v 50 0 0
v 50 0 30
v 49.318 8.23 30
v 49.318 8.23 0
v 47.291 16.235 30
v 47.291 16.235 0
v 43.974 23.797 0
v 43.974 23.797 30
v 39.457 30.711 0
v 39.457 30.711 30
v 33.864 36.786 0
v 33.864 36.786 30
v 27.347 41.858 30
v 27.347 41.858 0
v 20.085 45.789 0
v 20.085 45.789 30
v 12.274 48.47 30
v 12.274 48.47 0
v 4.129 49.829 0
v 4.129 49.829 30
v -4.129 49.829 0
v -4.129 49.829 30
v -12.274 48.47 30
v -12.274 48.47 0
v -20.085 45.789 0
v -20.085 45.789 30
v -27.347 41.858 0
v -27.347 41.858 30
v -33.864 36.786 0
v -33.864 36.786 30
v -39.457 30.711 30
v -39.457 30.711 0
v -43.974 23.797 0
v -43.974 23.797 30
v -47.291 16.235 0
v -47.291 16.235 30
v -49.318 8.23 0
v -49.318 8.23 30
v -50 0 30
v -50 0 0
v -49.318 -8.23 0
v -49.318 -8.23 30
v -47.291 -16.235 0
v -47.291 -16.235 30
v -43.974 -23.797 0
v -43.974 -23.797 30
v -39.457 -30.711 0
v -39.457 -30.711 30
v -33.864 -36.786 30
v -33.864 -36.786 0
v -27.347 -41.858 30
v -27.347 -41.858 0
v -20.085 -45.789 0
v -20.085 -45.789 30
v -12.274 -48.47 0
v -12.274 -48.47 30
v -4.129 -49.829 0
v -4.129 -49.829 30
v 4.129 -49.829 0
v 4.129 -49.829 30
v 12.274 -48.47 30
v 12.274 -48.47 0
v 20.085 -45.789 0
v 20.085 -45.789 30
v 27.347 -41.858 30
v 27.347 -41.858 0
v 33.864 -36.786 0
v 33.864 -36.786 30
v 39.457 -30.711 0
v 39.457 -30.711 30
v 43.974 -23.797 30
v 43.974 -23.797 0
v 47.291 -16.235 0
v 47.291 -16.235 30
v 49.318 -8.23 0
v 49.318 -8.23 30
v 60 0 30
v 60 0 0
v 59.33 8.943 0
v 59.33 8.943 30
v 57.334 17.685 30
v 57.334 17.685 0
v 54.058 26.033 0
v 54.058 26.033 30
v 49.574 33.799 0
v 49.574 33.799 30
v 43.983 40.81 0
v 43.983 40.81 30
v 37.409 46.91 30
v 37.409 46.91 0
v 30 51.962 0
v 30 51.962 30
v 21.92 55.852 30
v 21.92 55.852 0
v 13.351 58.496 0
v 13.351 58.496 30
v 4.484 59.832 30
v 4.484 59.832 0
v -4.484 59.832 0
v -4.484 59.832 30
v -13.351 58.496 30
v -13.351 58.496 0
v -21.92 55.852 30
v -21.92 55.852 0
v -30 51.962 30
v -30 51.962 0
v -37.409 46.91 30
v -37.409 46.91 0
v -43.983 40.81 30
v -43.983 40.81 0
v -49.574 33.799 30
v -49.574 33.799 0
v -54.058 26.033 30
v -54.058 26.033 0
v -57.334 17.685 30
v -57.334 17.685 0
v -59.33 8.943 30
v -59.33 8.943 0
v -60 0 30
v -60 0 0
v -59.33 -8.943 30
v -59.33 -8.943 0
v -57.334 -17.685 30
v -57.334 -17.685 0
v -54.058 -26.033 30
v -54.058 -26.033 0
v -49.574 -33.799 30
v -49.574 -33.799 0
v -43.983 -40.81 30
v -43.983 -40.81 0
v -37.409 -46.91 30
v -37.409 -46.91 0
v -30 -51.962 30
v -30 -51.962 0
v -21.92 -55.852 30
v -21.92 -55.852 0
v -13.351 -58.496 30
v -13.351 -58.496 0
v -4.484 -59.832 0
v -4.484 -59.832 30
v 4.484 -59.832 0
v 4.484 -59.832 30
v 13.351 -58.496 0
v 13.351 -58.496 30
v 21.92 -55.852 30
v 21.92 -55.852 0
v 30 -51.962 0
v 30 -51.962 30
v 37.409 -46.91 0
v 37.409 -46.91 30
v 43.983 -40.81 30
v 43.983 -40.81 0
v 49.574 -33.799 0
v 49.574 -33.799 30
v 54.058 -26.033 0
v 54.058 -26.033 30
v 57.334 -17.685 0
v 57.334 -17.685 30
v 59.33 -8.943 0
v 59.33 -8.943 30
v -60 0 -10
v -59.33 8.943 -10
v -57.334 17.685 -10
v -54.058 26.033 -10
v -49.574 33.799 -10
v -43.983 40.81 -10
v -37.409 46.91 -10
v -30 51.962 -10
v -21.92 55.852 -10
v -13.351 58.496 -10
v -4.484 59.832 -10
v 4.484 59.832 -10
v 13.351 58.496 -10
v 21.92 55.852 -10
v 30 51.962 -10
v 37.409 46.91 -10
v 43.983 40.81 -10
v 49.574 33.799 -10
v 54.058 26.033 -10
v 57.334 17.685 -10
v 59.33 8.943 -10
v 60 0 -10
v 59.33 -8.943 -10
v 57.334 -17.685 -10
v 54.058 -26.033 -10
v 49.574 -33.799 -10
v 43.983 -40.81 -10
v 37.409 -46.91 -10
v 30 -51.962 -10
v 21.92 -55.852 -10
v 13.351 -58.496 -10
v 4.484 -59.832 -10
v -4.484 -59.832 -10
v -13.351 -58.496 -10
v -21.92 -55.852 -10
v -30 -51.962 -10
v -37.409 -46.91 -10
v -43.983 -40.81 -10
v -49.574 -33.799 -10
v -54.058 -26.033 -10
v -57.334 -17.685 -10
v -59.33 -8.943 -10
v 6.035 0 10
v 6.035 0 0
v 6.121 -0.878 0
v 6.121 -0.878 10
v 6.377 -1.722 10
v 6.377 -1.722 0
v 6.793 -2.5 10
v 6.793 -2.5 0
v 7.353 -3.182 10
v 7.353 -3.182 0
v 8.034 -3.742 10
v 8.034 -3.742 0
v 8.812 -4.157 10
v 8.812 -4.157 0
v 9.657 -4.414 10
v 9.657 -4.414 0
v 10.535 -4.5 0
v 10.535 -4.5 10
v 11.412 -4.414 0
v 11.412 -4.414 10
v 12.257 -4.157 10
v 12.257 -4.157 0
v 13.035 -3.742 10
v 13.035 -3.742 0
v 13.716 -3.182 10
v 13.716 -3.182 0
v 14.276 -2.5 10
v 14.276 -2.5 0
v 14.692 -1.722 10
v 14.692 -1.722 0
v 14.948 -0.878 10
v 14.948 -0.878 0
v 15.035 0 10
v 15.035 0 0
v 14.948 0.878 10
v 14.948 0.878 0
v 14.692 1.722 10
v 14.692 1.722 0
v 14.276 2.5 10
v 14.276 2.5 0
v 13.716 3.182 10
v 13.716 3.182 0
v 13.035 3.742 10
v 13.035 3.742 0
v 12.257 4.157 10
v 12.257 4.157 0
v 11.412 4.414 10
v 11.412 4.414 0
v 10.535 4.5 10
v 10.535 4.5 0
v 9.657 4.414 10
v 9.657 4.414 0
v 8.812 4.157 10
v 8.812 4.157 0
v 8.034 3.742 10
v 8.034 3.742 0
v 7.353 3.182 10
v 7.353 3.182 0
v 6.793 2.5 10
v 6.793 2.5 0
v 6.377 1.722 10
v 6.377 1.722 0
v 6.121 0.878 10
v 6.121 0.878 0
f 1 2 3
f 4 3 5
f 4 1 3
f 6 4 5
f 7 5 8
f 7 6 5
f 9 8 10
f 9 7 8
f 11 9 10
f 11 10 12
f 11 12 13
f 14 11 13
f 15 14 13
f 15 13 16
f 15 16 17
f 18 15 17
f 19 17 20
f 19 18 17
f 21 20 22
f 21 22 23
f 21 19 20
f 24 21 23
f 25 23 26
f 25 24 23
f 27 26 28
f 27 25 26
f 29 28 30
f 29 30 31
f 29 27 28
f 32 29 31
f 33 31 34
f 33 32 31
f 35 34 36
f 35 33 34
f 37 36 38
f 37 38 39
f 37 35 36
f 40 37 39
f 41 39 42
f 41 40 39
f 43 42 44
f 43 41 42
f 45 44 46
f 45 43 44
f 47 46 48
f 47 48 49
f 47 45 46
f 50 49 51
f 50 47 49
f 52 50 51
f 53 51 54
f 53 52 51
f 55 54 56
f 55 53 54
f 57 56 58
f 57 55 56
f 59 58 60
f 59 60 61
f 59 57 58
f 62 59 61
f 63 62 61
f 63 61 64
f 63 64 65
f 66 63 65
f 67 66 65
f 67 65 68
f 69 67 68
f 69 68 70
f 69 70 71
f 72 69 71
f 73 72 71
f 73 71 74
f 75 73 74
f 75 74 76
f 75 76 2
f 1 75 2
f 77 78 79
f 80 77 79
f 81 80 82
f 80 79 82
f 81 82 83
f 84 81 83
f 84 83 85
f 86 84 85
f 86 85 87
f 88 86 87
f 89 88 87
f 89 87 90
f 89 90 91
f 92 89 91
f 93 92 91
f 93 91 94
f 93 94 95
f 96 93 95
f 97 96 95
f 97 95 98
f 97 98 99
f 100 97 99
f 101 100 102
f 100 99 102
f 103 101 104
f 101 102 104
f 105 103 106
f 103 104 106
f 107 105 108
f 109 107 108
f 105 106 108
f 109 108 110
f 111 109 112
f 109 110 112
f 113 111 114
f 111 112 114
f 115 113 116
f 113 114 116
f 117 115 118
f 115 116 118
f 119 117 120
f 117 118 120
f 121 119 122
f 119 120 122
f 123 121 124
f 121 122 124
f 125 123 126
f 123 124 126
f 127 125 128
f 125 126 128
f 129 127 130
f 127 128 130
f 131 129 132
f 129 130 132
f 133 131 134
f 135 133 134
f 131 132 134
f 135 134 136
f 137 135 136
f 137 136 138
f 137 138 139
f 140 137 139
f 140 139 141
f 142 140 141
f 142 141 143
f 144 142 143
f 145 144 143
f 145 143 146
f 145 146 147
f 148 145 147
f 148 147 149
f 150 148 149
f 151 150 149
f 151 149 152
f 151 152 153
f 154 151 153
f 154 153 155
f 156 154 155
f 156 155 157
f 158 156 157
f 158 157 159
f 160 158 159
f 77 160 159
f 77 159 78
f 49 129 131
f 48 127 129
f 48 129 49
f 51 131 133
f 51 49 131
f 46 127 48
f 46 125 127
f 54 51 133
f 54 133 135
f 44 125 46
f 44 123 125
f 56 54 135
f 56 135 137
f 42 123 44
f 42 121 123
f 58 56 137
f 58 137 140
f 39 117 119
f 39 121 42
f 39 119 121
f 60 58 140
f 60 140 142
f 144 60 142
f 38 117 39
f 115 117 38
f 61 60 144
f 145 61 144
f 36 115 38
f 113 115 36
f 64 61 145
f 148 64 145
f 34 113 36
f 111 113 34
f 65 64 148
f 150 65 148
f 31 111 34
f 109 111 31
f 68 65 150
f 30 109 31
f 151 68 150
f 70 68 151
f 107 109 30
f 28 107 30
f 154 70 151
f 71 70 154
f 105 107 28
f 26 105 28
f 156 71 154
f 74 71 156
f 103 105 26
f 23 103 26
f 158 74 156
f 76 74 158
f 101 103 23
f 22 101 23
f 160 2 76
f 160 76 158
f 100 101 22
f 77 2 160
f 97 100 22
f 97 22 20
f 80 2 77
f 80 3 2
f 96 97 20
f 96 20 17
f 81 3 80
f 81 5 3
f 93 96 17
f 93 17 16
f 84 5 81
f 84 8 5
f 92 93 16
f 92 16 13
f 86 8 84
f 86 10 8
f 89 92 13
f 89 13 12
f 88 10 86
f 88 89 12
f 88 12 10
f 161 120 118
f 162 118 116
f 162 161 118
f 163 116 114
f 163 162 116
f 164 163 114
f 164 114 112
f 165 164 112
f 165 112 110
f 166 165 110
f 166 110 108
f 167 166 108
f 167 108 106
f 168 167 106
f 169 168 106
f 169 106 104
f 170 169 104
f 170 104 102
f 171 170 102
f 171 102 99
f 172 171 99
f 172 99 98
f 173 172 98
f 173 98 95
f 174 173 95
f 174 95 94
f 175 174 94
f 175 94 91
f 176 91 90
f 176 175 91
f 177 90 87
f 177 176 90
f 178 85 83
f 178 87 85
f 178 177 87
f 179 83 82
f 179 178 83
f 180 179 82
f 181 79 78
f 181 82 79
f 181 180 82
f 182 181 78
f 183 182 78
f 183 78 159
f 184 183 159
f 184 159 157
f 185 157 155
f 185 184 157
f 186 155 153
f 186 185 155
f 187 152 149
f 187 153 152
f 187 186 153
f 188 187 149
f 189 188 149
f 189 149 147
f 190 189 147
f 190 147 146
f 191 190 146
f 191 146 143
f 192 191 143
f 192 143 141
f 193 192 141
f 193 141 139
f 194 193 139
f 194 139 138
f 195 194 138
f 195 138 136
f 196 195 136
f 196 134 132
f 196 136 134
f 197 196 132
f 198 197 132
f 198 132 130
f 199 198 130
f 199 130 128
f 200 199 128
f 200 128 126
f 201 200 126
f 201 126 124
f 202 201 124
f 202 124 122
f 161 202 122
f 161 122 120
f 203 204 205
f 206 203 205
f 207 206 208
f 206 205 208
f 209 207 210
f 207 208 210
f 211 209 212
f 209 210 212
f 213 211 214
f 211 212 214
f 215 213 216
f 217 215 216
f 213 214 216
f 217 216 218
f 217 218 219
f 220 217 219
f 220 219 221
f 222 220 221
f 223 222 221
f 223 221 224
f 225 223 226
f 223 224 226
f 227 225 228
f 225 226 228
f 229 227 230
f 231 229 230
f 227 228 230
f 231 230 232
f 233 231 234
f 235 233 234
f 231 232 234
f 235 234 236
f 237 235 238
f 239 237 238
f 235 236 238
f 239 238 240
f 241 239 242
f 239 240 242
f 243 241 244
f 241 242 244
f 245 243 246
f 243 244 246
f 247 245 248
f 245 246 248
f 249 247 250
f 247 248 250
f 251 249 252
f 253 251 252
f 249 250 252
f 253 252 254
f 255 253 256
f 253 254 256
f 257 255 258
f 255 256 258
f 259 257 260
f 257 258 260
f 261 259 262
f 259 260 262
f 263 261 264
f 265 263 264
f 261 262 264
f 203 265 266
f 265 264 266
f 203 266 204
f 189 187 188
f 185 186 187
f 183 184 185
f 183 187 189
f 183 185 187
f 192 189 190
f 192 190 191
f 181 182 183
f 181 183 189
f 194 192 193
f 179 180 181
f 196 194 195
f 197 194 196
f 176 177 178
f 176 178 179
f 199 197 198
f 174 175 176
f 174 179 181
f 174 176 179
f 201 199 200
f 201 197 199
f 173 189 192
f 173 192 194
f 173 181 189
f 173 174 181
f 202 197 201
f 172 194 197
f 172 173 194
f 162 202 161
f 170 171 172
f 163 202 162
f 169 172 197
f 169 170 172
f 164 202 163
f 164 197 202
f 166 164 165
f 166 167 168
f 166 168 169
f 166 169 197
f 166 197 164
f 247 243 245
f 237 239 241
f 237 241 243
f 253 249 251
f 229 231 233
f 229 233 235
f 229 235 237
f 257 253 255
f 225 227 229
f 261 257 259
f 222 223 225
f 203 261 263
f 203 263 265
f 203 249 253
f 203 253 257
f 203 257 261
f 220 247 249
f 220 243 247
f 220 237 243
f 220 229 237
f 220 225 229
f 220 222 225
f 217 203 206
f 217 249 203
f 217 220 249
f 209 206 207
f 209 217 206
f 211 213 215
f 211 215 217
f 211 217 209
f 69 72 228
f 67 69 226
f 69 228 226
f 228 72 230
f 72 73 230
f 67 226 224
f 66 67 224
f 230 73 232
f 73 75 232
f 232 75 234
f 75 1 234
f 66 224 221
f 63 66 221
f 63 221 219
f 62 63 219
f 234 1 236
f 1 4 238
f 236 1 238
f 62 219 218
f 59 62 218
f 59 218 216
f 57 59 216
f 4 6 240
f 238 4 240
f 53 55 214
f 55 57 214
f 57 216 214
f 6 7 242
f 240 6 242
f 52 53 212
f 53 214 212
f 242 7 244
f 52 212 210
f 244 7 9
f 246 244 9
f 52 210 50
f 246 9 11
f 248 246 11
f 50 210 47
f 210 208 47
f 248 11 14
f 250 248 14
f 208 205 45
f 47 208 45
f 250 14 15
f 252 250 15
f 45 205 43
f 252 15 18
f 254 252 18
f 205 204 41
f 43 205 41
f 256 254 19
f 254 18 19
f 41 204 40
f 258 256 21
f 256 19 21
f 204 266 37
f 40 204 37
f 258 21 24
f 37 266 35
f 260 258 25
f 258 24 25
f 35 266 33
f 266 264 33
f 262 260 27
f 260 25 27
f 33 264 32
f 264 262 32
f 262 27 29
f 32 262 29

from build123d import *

# Parameters (mm, degrees)
SKETCH1_R           = 60
SKETCH1_R_2         = 50
BOSS_EXTRUDE2_DEPTH = 30
BOSS_EXTRUDE3_START = 10
SKETCH2_R           = 60
BOSS_EXTRUDE3_DEPTH = 10
SKETCH3_R           = 4.5
BOSS_EXTRUDE4_DEPTH = 10


with BuildPart() as part:
    # Sketch1 → Boss-Extrude2 (new body)
    with BuildSketch(Plane.XY):
        Circle(SKETCH1_R)
        Circle(SKETCH1_R_2, mode=Mode.SUBTRACT)
    extrude(amount=BOSS_EXTRUDE2_DEPTH)

    # Sketch2 → Boss-Extrude3 (add)
    with BuildSketch(Plane(origin=(0, 0, 0), x_dir=(-1, 0, 0), z_dir=(0, 0, -1)).offset(BOSS_EXTRUDE3_START)):
        Circle(SKETCH2_R)
    extrude(amount=-BOSS_EXTRUDE3_DEPTH)

    # Sketch3 → Boss-Extrude4 (add)
    with BuildSketch(Plane.XY):
        with Locations(Location((10.534503936, 0, 0), (0, 0, 180))):
            Circle(SKETCH3_R)
    extrude(amount=BOSS_EXTRUDE4_DEPTH)


solid = part.part
